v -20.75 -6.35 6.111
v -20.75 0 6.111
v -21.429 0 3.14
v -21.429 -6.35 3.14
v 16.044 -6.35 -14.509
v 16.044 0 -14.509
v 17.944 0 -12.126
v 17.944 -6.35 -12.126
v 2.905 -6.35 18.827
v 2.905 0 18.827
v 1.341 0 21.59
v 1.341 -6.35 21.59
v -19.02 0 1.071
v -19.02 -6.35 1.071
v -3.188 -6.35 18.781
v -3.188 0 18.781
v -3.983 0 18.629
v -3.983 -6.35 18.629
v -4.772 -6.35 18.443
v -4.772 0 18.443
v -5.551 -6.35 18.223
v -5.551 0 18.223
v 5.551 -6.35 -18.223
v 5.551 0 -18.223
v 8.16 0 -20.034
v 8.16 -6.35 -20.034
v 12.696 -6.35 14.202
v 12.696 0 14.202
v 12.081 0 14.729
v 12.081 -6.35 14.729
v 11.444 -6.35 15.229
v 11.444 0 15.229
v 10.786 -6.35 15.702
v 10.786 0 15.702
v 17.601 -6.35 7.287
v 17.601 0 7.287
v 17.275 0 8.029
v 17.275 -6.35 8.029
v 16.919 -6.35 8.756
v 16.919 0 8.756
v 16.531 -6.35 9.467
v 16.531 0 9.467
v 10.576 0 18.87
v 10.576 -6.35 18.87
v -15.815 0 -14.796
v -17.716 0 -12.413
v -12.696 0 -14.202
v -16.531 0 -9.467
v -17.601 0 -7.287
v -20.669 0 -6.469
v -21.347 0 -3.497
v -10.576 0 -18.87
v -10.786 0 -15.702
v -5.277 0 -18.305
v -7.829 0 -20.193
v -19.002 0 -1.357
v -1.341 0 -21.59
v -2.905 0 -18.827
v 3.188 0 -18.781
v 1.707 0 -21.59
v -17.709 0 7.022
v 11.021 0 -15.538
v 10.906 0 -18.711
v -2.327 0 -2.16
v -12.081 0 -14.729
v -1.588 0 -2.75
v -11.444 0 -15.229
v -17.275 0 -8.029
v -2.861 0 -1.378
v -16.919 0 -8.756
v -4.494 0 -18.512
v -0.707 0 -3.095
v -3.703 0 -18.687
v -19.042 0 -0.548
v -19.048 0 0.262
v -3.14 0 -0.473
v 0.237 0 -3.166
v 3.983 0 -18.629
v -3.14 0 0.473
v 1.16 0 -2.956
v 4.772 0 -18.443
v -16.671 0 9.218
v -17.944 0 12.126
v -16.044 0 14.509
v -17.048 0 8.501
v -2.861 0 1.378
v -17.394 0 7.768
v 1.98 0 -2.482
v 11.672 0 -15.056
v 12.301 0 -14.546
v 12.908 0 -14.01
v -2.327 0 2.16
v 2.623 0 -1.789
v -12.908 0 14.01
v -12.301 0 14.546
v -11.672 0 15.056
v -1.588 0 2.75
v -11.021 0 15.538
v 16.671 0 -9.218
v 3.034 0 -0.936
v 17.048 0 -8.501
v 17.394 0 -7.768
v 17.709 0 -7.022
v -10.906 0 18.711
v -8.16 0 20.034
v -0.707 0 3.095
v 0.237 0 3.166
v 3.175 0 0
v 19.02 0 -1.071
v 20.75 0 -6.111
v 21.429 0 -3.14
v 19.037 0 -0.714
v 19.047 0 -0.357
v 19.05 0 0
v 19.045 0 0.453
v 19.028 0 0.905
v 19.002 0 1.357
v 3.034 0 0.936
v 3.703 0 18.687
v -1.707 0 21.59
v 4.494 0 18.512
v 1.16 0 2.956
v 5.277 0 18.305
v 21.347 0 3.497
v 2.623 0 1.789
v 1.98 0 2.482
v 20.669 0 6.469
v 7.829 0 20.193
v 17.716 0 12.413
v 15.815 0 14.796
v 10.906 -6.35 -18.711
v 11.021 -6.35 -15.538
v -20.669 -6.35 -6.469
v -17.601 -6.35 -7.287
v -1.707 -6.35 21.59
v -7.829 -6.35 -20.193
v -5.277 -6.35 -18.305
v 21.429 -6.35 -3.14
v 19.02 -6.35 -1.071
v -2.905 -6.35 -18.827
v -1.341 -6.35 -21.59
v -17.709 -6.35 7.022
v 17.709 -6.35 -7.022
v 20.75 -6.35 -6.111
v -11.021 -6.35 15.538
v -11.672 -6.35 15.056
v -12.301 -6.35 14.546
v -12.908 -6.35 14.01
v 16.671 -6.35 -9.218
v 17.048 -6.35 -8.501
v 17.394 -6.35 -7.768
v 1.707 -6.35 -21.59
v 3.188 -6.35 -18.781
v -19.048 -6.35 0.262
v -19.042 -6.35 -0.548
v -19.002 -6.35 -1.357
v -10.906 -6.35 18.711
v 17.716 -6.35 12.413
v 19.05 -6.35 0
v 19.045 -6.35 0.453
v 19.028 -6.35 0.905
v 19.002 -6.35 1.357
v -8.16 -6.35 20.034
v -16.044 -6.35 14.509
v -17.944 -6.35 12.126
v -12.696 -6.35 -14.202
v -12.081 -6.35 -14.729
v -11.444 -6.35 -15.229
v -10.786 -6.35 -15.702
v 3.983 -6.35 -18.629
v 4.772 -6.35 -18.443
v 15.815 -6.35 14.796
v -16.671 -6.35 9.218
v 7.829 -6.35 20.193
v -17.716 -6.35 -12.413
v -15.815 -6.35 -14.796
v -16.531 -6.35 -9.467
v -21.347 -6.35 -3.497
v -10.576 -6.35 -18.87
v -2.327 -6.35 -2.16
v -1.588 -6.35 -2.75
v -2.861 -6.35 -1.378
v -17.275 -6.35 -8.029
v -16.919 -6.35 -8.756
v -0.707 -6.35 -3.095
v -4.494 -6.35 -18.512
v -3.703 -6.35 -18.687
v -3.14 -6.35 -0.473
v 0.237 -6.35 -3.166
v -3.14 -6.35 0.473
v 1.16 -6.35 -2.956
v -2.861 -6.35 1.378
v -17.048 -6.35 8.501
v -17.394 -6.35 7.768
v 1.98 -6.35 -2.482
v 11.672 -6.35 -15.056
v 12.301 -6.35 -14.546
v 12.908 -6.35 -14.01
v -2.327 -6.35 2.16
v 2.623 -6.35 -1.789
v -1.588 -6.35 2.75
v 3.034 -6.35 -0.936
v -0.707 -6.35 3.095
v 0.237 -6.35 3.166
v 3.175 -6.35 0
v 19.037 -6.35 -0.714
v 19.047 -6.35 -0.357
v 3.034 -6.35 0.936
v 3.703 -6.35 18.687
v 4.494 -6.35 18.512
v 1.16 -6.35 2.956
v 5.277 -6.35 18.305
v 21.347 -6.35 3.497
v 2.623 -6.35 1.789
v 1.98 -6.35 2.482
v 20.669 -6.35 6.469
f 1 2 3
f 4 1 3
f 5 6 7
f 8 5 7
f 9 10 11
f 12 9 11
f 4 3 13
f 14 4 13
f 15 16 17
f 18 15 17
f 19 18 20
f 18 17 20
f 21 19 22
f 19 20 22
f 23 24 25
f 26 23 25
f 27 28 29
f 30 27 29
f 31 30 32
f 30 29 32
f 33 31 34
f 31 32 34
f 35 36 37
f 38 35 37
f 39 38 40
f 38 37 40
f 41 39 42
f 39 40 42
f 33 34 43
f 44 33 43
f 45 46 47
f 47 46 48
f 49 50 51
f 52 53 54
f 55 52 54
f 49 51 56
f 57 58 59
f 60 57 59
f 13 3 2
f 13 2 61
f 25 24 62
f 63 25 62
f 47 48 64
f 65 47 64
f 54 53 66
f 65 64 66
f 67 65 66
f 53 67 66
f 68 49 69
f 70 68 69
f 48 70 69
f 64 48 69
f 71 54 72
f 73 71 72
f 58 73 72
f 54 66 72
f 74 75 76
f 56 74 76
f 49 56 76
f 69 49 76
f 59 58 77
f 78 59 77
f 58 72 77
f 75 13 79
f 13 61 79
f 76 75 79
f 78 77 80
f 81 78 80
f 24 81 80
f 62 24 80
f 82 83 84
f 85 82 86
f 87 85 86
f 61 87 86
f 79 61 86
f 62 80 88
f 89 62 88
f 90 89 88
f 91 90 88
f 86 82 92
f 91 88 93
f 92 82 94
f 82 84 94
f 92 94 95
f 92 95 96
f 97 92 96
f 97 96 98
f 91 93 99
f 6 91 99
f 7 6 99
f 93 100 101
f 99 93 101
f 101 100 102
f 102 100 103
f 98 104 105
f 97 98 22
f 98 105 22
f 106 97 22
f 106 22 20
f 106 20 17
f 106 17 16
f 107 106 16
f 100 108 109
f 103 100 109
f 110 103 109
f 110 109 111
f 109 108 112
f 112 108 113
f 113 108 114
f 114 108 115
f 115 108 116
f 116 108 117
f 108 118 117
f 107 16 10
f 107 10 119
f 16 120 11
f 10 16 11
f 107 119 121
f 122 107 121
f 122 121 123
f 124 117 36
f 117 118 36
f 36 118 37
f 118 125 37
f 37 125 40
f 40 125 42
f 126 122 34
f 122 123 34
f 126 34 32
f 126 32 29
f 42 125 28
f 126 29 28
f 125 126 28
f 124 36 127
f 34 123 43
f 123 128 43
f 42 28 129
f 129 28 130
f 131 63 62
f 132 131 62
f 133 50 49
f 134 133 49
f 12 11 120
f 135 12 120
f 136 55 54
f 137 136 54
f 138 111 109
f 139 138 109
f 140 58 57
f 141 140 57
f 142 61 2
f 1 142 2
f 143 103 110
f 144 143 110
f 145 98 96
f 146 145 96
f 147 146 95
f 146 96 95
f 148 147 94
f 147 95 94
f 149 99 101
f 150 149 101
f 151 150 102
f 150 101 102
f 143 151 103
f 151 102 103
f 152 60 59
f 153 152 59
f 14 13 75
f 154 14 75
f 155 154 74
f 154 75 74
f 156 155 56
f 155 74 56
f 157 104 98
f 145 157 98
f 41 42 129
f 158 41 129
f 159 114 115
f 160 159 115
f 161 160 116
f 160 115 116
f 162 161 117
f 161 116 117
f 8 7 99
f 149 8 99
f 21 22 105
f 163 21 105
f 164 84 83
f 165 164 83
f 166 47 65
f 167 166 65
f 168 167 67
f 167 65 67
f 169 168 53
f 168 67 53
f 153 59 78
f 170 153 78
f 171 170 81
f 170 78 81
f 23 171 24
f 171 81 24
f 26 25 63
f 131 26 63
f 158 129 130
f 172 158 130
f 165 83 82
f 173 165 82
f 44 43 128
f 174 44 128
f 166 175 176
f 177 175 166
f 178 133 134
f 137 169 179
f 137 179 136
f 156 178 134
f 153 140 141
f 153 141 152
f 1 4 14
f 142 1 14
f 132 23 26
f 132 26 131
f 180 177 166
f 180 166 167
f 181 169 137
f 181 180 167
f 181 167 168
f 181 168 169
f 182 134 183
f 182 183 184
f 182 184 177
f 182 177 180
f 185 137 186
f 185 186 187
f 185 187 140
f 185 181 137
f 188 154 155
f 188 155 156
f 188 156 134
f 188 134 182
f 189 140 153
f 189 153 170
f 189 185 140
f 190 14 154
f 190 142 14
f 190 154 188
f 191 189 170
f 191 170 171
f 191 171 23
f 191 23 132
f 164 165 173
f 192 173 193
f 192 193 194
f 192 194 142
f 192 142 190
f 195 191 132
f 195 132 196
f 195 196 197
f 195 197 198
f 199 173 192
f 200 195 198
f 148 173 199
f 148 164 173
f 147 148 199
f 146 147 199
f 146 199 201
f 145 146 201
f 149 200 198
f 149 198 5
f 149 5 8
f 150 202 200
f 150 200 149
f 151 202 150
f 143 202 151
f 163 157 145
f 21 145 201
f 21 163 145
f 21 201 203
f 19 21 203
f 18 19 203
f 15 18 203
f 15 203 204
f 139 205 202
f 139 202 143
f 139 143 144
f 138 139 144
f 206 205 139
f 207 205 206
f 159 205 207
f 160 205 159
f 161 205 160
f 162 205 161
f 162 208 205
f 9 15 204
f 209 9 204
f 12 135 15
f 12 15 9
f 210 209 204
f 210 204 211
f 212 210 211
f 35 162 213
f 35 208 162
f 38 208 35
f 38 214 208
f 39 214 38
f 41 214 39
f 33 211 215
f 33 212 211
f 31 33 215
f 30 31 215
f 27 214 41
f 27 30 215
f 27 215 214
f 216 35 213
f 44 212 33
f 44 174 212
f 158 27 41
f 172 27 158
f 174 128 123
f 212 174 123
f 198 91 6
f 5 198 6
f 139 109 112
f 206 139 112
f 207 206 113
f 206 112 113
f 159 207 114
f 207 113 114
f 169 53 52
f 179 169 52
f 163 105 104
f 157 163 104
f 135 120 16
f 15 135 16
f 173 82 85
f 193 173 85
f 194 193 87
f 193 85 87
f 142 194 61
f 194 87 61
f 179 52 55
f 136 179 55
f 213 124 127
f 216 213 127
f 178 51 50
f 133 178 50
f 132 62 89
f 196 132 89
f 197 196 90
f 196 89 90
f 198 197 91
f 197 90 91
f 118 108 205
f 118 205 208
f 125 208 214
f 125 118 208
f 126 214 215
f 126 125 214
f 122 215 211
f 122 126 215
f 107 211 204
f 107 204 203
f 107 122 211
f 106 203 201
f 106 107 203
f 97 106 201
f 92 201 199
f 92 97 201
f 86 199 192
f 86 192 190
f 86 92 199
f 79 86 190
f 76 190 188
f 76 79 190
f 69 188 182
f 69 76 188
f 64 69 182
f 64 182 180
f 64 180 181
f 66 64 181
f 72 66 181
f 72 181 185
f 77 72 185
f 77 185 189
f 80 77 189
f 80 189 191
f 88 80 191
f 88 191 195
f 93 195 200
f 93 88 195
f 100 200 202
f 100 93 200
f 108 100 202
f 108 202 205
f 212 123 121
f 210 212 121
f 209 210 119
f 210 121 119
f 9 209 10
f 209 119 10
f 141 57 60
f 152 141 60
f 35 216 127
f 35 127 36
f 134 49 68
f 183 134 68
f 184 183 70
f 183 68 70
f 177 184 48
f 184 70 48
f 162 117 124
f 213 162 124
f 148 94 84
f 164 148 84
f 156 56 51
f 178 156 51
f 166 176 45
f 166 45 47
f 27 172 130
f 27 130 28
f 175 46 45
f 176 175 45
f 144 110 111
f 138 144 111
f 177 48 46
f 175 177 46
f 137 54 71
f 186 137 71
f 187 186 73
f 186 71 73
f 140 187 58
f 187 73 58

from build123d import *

# Parameters (mm, degrees)
F0_R     = 3.175
F1_DEPTH = 6.35


with BuildPart() as f1:
    # F0 (on Front) → F1 (new body)
    with BuildSketch(Plane.XZ):
        with BuildLine():
            ThreePointArc((19.019852, -1.071327), (19.042461, -0.535875), (19.05, 0))
            ThreePointArc((19.05, 0), (19.037896, 0.678973), (19.001601, 1.357083))
            ThreePointArc((19.001601, 1.357083), (18.539994, 4.378484), (17.601125, 7.287173))
            ThreePointArc((17.601125, 7.287173), (17.100853, 8.394243), (16.531034, 9.467175))
            ThreePointArc((16.531034, 9.467175), (14.804204, 11.98908), (12.69628, 14.202358))
            ThreePointArc((12.69628, 14.202358), (11.765211, 14.982734), (10.786294, 15.702177))
            ThreePointArc((10.786294, 15.702177), (8.136261, 17.225091), (5.276781, 18.304592))
            ThreePointArc((5.276781, 18.304592), (4.099324, 18.60371), (2.905195, 18.82717))
            ThreePointArc((2.905195, 18.82717), (-0.14317, 19.049462), (-3.187849, 18.781377))
            ThreePointArc((-3.187849, 18.781377), (-4.378484, 18.539994), (-5.551312, 18.223211))
            ThreePointArc((-5.551312, 18.223211), (-8.394243, 17.100853), (-11.021087, 15.53828))
            ThreePointArc((-11.021087, 15.53828), (-11.98908, 14.804204), (-12.908315, 14.009922))
            ThreePointArc((-12.908315, 14.009922), (-14.982734, 11.765211), (-16.671463, 9.217636))
            ThreePointArc((-16.671463, 9.217636), (-17.225091, 8.136261), (-17.708667, 7.021796))
            ThreePointArc((-17.708667, 7.021796), (-18.60371, 4.099324), (-19.019852, 1.071327))
            ThreePointArc((-19.019852, 1.071327), (-19.049462, -0.14317), (-19.001601, -1.357083))
            ThreePointArc((-19.001601, -1.357083), (-18.539994, -4.378484), (-17.601125, -7.287173))
            ThreePointArc((-17.601125, -7.287173), (-17.100853, -8.394243), (-16.531034, -9.467175))
            ThreePointArc((-16.531034, -9.467175), (-14.804204, -11.98908), (-12.69628, -14.202358))
            ThreePointArc((-12.69628, -14.202358), (-11.765211, -14.982734), (-10.786294, -15.702177))
            ThreePointArc((-10.786294, -15.702177), (-8.136261, -17.225091), (-5.276781, -18.304592))
            ThreePointArc((-5.276781, -18.304592), (-4.099324, -18.60371), (-2.905195, -18.82717))
            ThreePointArc((-2.905195, -18.82717), (0.14317, -19.049462), (3.187849, -18.781377))
            ThreePointArc((3.187849, -18.781377), (4.378484, -18.539994), (5.551312, -18.223211))
            ThreePointArc((5.551312, -18.223211), (8.394243, -17.100853), (11.021087, -15.53828))
            ThreePointArc((11.021087, -15.53828), (11.98908, -14.804204), (12.908315, -14.009922))
            ThreePointArc((12.908315, -14.009922), (14.982734, -11.765211), (16.671463, -9.217636))
            ThreePointArc((16.671463, -9.217636), (17.225091, -8.136261), (17.708667, -7.021796))
            ThreePointArc((17.708667, -7.021796), (18.60371, -4.099324), (19.019852, -1.071327))
        make_face()
        Circle(F0_R, mode=Mode.SUBTRACT)
        with BuildLine():
            ThreePointArc((17.601125, 7.287173), (18.539994, 4.378484), (19.001601, 1.357083))
            Line((19.001601, 1.357083), (21.347045, 3.497063))
            Line((21.347045, 3.497063), (20.668801, 6.468644))
            Line((20.668801, 6.468644), (17.601125, 7.287173))
        make_face()
        with BuildLine():
            Line((21.428586, -3.13981), (19.019852, -1.071327))
            ThreePointArc((19.019852, -1.071327), (18.60371, -4.099324), (17.708667, -7.021796))
            Line((17.708667, -7.021796), (20.750342, -6.11139))
            Line((20.750342, -6.11139), (21.428586, -3.13981))
        make_face()
        with BuildLine():
            ThreePointArc((12.69628, 14.202358), (14.804204, 11.98908), (16.531034, 9.467175))
            Line((16.531034, 9.467175), (17.715704, 12.412881))
            Line((17.715704, 12.412881), (15.815307, 14.795903))
            Line((15.815307, 14.795903), (12.69628, 14.202358))
        make_face()
        with BuildLine():
            Line((17.944176, -12.126386), (16.671463, -9.217636))
            ThreePointArc((16.671463, -9.217636), (14.982734, -11.765211), (12.908315, -14.009922))
            Line((12.908315, -14.009922), (16.043779, -14.509409))
            Line((16.043779, -14.509409), (17.944176, -12.126386))
        make_face()
        with BuildLine():
            ThreePointArc((5.276781, 18.304592), (8.136261, 17.225091), (10.786294, 15.702177))
            Line((10.786294, 15.702177), (10.575551, 18.870175))
            Line((10.575551, 18.870175), (7.829398, 20.192653))
            Line((7.829398, 20.192653), (5.276781, 18.304592))
        make_face()
        with BuildLine():
            Line((10.905702, -18.711183), (11.021087, -15.53828))
            ThreePointArc((11.021087, -15.53828), (8.394243, -17.100853), (5.551312, -18.223211))
            Line((5.551312, -18.223211), (8.159549, -20.03366))
            Line((8.159549, -20.03366), (10.905702, -18.711183))
        make_face()
        with BuildLine():
            ThreePointArc((-3.187849, 18.781377), (-0.14317, 19.049462), (2.905195, 18.82717))
            Line((2.905195, 18.82717), (1.34078, 21.59))
            Line((1.34078, 21.59), (-1.70722, 21.59))
            Line((-1.70722, 21.59), (-3.187849, 18.781377))
        make_face()
        with BuildLine():
            Line((1.70722, -21.59), (3.187849, -18.781377))
            ThreePointArc((3.187849, -18.781377), (0.14317, -19.049462), (-2.905195, -18.82717))
            Line((-2.905195, -18.82717), (-1.34078, -21.59))
            Line((-1.34078, -21.59), (1.70722, -21.59))
        make_face()
        with BuildLine():
            ThreePointArc((-11.021087, 15.53828), (-8.394243, 17.100853), (-5.551312, 18.223211))
            Line((-5.551312, 18.223211), (-8.159549, 20.03366))
            Line((-8.159549, 20.03366), (-10.905702, 18.711183))
            Line((-10.905702, 18.711183), (-11.021087, 15.53828))
        make_face()
        with BuildLine():
            Line((-7.829398, -20.192653), (-5.276781, -18.304592))
            ThreePointArc((-5.276781, -18.304592), (-8.136261, -17.225091), (-10.786294, -15.702177))
            Line((-10.786294, -15.702177), (-10.575551, -18.870175))
            Line((-10.575551, -18.870175), (-7.829398, -20.192653))
        make_face()
        with BuildLine():
            ThreePointArc((-16.671463, 9.217636), (-14.982734, 11.765211), (-12.908315, 14.009922))
            Line((-12.908315, 14.009922), (-16.043779, 14.509409))
            Line((-16.043779, 14.509409), (-17.944176, 12.126386))
            Line((-17.944176, 12.126386), (-16.671463, 9.217636))
        make_face()
        with BuildLine():
            Line((-15.815307, -14.795903), (-12.69628, -14.202358))
            ThreePointArc((-12.69628, -14.202358), (-14.804204, -11.98908), (-16.531034, -9.467175))
            Line((-16.531034, -9.467175), (-17.715704, -12.412881))
            Line((-17.715704, -12.412881), (-15.815307, -14.795903))
        make_face()
        with BuildLine():
            ThreePointArc((-19.019852, 1.071327), (-18.60371, 4.099324), (-17.708667, 7.021796))
            Line((-17.708667, 7.021796), (-20.750342, 6.11139))
            Line((-20.750342, 6.11139), (-21.428586, 3.13981))
            Line((-21.428586, 3.13981), (-19.019852, 1.071327))
        make_face()
        with BuildLine():
            Line((-20.668801, -6.468644), (-17.601125, -7.287173))
            ThreePointArc((-17.601125, -7.287173), (-18.539994, -4.378484), (-19.001601, -1.357083))
            Line((-19.001601, -1.357083), (-21.347045, -3.497063))
            Line((-21.347045, -3.497063), (-20.668801, -6.468644))
        make_face()
    extrude(amount=F1_DEPTH)


solid = f1.part
